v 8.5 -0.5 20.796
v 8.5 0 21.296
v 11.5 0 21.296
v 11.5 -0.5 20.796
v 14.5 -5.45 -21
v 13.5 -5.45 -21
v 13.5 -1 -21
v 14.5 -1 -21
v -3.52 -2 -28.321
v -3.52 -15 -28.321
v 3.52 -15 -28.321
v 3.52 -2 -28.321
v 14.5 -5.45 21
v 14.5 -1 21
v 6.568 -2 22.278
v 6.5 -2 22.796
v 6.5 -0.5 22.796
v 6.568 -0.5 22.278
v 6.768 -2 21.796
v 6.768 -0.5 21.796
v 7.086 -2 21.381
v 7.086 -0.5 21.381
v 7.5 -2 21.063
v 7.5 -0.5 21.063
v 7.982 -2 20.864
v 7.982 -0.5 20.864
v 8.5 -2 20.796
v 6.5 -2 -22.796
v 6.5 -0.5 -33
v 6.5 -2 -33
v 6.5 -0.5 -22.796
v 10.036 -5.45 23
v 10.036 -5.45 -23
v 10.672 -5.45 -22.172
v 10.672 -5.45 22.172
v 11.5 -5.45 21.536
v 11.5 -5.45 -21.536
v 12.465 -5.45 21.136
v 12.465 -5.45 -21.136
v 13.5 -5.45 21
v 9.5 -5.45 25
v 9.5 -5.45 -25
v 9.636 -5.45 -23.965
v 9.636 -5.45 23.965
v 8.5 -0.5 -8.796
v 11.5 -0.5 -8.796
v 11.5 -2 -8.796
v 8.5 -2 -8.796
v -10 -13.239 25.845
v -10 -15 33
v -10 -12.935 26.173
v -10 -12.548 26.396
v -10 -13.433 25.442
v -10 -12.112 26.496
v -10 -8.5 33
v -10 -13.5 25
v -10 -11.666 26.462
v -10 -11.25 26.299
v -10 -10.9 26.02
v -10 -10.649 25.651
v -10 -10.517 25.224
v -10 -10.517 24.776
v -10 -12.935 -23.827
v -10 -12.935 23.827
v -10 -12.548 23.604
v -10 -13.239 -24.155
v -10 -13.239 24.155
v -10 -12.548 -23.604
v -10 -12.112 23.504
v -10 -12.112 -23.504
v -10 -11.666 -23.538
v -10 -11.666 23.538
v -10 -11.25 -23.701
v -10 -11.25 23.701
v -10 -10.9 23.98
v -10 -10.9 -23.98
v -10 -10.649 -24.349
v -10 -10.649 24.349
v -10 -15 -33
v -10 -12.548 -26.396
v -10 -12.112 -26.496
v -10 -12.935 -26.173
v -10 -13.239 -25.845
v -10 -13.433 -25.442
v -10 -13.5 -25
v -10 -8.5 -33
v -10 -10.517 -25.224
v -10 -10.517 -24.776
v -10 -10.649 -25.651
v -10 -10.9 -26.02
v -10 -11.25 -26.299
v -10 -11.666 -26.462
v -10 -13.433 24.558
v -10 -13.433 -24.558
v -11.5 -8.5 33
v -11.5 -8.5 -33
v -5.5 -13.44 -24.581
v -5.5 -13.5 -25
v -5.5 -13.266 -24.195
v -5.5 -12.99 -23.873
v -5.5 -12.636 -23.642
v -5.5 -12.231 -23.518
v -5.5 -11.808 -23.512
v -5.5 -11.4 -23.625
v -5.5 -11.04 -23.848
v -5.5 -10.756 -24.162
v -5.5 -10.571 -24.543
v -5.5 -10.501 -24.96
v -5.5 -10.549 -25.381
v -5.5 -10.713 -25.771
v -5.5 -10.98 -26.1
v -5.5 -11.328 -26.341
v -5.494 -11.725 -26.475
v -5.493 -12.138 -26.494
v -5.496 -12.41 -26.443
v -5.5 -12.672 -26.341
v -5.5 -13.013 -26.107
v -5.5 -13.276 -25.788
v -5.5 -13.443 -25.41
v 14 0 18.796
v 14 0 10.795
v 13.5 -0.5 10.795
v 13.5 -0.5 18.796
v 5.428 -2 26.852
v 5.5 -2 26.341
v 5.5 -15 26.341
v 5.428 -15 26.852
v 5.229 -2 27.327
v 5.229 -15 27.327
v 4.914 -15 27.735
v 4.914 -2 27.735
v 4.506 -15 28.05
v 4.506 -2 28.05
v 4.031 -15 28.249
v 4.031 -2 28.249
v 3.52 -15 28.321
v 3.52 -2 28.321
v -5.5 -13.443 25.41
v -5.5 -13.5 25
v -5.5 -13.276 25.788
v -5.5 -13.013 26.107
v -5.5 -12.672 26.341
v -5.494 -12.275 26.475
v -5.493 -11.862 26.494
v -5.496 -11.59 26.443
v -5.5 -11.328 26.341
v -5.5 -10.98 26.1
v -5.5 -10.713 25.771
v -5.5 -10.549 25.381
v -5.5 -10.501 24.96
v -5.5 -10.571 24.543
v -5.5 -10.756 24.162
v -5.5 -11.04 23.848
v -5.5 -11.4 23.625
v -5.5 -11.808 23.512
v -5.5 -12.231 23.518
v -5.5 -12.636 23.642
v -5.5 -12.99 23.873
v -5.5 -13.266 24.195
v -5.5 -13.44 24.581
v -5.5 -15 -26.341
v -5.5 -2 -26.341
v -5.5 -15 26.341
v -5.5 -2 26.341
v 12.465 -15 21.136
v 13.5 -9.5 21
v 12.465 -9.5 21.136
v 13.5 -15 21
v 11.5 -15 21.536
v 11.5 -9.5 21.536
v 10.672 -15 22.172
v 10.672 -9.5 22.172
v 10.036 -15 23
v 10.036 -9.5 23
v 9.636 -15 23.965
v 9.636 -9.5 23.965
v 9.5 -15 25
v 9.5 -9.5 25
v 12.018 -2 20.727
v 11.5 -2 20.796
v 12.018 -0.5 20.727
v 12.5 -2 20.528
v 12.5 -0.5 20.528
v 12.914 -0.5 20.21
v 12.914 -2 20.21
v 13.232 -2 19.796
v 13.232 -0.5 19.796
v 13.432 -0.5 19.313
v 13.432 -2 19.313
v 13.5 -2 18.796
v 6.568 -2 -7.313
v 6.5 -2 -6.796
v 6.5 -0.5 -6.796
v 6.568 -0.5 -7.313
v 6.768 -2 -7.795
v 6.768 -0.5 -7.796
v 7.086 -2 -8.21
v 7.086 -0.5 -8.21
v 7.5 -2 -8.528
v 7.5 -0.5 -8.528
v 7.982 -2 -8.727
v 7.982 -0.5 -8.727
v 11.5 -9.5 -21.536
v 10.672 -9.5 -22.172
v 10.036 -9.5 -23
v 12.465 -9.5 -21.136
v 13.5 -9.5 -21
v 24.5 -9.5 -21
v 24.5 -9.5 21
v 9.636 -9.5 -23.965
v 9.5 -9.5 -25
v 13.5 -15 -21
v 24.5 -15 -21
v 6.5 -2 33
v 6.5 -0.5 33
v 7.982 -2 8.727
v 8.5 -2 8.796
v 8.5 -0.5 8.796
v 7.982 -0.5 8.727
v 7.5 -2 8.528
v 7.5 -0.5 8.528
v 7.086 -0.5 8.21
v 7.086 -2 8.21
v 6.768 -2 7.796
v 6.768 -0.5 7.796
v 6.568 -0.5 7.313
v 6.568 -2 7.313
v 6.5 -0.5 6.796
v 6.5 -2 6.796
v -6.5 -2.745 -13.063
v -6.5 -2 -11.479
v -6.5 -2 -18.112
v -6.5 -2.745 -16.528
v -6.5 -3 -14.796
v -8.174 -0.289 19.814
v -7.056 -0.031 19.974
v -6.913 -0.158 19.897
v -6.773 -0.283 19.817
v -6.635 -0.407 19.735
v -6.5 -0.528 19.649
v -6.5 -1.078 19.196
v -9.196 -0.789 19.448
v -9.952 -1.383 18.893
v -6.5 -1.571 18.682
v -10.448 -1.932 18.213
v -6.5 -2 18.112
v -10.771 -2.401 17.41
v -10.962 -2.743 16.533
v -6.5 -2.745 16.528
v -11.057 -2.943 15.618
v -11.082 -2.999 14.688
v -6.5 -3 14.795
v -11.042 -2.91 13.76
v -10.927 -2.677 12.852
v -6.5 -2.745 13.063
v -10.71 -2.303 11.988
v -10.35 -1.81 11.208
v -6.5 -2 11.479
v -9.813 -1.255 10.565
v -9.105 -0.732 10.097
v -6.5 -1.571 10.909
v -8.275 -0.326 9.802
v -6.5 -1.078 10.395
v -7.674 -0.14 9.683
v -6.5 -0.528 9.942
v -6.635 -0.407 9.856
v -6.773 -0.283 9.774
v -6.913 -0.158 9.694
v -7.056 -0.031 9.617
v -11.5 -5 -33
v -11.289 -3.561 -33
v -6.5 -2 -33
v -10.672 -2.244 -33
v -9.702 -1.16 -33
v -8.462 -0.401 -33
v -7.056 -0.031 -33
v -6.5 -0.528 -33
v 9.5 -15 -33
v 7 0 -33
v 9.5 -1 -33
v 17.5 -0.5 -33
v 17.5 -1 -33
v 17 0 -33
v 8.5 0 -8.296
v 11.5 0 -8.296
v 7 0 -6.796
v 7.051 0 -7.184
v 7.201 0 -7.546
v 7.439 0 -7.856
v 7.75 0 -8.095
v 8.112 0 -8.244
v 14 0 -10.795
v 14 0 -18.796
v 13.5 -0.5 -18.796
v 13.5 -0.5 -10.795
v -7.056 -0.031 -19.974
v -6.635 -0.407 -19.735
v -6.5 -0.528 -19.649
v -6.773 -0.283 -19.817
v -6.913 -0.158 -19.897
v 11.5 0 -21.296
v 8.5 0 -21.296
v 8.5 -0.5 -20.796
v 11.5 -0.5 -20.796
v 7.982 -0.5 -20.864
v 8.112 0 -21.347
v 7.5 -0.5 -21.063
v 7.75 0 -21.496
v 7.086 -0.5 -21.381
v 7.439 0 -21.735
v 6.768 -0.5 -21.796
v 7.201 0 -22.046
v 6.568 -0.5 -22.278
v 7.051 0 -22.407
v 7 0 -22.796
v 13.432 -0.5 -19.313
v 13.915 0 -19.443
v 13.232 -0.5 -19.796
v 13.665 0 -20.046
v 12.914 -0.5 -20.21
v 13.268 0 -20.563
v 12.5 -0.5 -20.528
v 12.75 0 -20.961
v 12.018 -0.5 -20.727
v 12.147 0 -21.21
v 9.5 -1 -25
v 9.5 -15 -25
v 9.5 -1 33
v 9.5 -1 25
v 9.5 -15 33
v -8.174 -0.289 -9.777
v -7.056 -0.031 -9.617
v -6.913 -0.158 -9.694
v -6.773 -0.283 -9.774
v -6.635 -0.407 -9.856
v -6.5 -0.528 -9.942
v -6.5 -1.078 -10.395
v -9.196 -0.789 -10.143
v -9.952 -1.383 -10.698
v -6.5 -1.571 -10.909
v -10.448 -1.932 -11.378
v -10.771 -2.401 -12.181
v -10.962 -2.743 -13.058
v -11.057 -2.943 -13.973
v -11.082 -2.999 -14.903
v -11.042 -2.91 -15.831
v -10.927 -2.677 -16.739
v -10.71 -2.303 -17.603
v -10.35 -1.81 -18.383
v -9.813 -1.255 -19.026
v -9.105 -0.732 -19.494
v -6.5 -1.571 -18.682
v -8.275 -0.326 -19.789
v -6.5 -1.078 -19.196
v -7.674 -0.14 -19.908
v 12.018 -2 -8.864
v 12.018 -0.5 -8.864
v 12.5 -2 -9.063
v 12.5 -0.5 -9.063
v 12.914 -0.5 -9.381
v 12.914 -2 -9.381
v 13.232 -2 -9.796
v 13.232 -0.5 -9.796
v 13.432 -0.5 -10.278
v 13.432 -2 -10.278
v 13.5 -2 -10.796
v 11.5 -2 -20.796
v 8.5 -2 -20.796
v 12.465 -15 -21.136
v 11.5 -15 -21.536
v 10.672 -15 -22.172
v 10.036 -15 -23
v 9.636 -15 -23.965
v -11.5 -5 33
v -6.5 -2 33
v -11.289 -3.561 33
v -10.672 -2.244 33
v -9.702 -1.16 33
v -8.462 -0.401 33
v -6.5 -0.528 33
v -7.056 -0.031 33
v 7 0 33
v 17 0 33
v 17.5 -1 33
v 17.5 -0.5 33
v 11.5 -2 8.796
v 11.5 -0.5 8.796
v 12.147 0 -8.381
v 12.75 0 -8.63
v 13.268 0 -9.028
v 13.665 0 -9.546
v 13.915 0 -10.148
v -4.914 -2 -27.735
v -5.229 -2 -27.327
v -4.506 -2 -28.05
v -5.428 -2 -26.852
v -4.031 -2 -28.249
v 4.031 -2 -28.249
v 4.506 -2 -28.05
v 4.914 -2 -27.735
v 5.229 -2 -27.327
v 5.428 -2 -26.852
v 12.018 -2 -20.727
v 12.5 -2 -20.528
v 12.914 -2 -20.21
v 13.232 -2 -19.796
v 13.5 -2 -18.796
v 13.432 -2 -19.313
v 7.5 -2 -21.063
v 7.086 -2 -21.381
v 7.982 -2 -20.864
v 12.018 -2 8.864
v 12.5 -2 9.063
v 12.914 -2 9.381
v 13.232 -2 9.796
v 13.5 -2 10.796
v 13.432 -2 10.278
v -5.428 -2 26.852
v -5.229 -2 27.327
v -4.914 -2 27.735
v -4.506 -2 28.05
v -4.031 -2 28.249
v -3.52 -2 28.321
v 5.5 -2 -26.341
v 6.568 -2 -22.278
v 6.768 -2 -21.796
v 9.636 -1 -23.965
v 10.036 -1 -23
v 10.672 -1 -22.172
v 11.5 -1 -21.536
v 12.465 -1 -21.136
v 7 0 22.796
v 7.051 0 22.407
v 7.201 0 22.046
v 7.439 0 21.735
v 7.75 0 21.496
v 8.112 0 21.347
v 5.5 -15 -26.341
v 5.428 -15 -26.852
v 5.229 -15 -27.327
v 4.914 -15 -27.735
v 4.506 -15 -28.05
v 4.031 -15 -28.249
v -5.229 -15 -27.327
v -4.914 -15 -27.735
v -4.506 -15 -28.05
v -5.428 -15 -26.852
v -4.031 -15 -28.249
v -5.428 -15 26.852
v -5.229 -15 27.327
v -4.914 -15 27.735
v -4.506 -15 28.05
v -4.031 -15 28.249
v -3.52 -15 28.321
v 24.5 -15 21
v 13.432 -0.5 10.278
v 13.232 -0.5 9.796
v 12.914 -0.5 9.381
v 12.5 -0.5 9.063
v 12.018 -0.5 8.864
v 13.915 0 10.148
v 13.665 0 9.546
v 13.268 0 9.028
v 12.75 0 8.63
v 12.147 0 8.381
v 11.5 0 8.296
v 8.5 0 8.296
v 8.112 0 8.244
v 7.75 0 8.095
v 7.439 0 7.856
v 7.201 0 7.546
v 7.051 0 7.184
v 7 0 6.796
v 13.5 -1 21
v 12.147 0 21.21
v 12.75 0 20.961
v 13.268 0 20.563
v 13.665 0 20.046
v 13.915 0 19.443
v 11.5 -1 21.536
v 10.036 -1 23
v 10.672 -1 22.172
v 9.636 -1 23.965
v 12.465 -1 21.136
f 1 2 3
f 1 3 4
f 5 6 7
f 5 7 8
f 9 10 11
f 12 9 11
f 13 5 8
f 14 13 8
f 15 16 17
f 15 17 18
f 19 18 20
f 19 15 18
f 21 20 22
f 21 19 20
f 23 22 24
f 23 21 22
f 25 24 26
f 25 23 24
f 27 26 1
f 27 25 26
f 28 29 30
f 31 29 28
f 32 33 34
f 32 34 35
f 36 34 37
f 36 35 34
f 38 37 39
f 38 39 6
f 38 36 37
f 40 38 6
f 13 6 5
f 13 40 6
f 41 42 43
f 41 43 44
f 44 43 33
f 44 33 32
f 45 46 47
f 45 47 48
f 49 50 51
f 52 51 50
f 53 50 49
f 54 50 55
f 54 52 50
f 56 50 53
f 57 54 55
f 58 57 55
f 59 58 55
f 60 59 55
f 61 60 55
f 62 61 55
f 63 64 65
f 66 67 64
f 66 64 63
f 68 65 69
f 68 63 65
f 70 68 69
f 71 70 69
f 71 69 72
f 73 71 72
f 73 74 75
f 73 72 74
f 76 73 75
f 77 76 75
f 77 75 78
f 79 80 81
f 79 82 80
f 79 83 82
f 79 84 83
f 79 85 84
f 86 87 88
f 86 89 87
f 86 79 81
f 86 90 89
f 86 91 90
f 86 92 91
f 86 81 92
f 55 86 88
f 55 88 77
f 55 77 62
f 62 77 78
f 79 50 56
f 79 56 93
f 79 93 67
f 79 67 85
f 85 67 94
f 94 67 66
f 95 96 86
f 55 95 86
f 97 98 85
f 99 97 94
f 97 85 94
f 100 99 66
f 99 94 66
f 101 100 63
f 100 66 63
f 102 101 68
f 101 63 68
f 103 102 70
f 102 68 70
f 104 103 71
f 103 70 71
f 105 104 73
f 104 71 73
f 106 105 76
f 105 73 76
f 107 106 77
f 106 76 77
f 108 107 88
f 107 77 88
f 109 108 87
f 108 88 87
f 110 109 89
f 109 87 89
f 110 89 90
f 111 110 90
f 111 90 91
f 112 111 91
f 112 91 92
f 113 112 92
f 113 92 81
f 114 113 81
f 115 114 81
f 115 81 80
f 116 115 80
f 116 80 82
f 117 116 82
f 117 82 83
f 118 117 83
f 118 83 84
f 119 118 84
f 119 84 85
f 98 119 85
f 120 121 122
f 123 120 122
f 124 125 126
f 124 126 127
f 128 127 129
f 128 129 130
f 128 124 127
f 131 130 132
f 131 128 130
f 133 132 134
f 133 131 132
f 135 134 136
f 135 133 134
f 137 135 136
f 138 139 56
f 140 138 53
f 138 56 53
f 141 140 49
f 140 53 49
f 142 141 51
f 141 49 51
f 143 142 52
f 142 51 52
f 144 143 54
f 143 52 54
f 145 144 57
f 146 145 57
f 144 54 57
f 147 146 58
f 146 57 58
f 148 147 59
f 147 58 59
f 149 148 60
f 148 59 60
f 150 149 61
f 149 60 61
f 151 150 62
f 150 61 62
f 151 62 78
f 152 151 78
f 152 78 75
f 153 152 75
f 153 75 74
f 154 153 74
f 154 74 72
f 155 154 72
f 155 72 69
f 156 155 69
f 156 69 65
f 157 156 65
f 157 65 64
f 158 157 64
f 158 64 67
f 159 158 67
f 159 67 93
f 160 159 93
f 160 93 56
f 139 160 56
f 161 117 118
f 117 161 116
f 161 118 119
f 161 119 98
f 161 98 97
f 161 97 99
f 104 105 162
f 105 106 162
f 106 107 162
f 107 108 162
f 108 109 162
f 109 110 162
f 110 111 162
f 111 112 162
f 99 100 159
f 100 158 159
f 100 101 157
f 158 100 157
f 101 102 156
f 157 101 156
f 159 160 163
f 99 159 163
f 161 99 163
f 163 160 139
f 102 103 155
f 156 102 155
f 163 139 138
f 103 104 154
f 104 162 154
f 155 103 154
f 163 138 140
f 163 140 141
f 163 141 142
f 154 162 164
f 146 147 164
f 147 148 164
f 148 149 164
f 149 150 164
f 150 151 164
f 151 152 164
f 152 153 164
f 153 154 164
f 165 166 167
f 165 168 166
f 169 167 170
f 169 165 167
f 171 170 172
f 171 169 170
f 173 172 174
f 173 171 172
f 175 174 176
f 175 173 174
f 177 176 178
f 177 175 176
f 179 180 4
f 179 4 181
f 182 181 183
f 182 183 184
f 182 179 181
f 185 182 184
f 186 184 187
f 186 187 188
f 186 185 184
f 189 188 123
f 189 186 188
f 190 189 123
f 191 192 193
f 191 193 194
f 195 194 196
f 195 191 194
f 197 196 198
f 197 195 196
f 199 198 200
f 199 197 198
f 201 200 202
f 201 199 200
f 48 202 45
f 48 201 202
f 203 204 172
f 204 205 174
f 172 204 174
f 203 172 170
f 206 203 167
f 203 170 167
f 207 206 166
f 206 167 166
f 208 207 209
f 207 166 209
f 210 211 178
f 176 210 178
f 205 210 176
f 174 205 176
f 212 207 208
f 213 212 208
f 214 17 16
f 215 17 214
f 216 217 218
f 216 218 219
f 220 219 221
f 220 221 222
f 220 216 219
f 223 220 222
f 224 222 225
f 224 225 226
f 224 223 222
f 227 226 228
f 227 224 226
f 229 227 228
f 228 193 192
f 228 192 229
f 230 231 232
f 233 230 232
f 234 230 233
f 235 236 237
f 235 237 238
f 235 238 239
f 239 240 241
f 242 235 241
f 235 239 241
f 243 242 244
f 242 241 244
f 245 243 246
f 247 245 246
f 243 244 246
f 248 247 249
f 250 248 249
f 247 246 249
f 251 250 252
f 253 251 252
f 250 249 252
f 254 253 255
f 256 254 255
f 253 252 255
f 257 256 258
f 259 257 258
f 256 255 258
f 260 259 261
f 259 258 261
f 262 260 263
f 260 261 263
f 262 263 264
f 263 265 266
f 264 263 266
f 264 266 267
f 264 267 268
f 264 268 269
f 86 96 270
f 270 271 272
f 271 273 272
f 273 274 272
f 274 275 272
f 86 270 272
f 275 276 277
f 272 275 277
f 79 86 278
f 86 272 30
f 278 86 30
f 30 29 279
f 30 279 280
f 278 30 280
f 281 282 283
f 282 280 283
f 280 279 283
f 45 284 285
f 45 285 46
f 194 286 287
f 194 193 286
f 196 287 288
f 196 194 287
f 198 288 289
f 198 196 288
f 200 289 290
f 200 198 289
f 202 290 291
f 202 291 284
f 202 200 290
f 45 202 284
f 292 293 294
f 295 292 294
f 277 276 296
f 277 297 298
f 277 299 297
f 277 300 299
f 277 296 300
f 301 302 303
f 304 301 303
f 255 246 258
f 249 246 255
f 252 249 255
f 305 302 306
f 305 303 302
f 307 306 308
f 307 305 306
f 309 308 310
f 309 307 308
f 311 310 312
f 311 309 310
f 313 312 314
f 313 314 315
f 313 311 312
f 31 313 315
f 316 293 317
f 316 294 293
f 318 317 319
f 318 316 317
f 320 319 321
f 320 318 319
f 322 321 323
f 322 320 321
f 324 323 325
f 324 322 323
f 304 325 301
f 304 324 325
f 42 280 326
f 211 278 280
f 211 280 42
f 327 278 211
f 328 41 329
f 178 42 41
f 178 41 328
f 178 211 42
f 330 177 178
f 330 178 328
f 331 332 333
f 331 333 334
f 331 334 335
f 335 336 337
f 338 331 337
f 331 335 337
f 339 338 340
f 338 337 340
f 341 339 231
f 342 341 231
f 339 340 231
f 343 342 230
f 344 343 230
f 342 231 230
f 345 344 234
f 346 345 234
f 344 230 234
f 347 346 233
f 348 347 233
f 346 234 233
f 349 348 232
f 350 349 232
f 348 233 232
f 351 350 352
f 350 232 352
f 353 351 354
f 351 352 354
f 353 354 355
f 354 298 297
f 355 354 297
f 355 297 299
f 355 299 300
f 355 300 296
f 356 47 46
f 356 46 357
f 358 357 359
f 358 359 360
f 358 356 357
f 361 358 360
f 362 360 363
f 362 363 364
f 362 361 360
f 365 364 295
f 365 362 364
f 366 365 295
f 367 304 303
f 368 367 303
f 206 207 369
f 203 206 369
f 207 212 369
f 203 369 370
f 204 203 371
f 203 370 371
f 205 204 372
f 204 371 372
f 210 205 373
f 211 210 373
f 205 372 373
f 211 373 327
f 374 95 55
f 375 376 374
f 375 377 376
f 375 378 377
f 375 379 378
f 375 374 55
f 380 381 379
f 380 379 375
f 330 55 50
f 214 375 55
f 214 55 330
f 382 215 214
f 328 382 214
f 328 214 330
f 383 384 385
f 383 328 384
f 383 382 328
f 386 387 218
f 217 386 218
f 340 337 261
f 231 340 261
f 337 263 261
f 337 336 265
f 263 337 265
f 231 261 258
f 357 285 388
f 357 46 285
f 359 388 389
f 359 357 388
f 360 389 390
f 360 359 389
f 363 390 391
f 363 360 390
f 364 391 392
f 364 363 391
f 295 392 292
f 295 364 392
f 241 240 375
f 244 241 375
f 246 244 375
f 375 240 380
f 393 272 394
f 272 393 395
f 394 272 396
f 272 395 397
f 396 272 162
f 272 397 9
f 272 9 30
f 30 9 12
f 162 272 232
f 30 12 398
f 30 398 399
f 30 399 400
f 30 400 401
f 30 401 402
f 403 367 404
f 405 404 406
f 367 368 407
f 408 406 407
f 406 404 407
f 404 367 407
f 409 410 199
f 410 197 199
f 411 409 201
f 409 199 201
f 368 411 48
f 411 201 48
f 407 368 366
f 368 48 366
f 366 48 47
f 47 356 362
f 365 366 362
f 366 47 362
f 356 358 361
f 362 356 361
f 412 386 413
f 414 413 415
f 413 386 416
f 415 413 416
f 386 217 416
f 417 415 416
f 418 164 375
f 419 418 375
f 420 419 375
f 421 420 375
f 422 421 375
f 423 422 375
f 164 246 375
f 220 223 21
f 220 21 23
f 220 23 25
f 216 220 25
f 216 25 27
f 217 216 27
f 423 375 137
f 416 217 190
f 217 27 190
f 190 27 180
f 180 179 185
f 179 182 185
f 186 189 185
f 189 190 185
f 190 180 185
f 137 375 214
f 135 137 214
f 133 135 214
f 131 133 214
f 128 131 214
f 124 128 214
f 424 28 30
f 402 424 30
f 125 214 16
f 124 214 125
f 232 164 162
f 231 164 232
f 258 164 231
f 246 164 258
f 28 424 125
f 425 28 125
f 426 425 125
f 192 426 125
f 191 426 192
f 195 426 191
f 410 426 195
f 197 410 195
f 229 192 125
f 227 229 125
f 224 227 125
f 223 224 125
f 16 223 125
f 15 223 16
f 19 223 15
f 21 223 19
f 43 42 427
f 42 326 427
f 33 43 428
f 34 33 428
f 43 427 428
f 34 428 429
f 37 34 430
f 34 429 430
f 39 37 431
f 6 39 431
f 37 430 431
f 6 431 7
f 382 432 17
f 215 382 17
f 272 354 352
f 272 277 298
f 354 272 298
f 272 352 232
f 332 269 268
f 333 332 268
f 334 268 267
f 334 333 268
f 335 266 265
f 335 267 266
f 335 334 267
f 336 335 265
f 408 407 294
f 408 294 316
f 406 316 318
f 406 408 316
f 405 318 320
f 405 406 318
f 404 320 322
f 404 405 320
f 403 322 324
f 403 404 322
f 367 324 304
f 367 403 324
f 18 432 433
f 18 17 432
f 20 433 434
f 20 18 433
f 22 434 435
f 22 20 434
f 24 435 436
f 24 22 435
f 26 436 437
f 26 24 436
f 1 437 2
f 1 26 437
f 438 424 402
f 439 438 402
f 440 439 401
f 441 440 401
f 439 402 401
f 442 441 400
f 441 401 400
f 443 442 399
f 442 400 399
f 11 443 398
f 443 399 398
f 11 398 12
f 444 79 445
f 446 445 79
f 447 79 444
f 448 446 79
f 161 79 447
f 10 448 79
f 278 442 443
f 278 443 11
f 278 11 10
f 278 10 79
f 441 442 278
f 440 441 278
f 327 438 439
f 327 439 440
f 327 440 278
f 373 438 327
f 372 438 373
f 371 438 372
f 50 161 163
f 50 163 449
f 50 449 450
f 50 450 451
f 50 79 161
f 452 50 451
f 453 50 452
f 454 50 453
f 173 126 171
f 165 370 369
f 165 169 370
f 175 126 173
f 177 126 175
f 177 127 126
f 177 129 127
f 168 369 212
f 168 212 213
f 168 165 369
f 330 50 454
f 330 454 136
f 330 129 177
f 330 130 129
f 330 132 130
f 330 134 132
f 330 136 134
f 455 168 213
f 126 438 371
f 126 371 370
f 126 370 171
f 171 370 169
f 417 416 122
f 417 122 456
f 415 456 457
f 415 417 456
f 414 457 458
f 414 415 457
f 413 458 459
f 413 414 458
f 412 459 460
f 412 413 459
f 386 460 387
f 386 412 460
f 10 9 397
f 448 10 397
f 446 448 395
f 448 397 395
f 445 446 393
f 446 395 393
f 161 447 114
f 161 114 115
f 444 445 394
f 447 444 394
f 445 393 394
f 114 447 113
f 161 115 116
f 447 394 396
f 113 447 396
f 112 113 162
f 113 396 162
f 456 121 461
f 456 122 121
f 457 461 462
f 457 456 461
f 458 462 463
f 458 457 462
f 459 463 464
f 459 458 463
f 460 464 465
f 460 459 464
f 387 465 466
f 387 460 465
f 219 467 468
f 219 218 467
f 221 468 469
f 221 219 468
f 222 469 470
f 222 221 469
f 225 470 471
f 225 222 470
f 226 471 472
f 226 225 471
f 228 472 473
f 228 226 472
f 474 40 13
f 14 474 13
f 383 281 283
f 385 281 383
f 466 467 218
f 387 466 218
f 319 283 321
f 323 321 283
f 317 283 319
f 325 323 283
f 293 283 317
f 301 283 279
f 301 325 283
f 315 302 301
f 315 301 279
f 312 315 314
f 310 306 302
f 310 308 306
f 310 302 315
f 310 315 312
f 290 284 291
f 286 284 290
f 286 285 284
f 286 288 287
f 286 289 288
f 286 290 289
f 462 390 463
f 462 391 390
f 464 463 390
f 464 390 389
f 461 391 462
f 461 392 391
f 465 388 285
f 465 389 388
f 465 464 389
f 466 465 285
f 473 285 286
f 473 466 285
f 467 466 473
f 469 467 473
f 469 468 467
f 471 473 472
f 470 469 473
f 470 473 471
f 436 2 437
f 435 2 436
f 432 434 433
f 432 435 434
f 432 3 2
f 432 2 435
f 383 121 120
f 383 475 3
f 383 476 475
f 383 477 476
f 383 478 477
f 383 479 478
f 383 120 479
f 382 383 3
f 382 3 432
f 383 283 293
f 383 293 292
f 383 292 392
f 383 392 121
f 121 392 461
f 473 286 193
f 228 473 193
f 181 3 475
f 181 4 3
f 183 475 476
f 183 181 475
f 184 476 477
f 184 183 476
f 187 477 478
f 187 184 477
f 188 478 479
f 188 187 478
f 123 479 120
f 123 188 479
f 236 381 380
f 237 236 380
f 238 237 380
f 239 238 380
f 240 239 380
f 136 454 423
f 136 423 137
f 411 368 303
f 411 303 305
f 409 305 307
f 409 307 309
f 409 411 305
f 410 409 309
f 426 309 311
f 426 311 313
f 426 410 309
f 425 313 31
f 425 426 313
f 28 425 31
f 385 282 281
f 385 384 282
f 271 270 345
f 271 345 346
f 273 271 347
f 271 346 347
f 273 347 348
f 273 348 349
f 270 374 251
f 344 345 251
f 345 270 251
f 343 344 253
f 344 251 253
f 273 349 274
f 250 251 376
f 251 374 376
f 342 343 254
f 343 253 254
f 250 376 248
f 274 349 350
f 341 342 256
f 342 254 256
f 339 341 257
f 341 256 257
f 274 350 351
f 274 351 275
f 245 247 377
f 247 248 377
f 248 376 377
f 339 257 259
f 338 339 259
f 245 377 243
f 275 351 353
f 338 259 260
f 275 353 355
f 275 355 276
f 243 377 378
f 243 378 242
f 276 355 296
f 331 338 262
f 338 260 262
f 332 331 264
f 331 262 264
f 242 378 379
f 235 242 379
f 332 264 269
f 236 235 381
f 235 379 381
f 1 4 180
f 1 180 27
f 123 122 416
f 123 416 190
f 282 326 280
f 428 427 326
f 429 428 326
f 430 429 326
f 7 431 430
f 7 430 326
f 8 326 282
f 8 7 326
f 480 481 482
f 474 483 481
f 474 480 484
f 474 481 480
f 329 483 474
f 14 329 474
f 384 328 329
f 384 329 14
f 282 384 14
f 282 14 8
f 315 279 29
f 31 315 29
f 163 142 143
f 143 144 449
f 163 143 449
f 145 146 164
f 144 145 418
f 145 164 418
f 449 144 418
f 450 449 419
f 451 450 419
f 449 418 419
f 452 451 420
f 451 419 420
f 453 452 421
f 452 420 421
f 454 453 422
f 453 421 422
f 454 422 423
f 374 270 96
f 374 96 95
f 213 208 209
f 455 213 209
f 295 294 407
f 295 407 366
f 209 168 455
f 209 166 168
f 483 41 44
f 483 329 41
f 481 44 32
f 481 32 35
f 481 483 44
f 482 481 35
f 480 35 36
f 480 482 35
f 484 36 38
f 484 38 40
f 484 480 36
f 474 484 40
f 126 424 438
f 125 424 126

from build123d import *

# Parameters (mm, degrees)
F0_W           = 21
F0_H           = 66
F0_W_2         = 11
F0_H_2         = 56.642
F1_DEPTH       = 15
F2_R           = 5
F4_START       = 9.5
F3_W           = 15
F3_H           = 42
F4_DEPTH       = 5.5
F5_T1_DEPTH    = 15
F6_W           = 1.5
F6_H           = 6.5
F7_DEPTH       = 50
F7_DEPTH_BACK  = 50
F8_R           = 1.5
F9_DEPTH       = 5
F10_W          = 3
F10_H          = 1
F11_DEPTH      = 33
F11_DEPTH_BACK = 33
F12_SIZE       = 0.5
F13_W          = 5
F13_H          = 12
F14_DEPTH      = 14
F15_R          = 4
F16_W          = 13
F16_H          = 70
F17_DEPTH      = 2
F18_W          = 20
F18_H          = 12
F19_DEPTH      = 2
F20_R          = 2
F21_T1_DEPTH   = 68.8536746712
F21_T3_DEPTH   = 11.490341494
F21_T5_DEPTH   = 3
F21_T7_DEPTH   = 8
F21_T9_DEPTH   = 11.490341494
F21_T11_DEPTH  = 13.591
F21_T13_DEPTH  = 8
F21_T16_ANGLE  = 90
F21_T18_ANGLE  = 90
F21_T20_ANGLE  = 90
F21_T22_ANGLE  = 90
F21_T24_ANGLE  = 90
F21_T26_ANGLE  = 90
F21_T28_ANGLE  = 90
F21_T30_ANGLE  = 90
F23_START      = -6.5
F22_R          = 6
F23_DEPTH      = 5.001


# Not quite as in the source:
# - a fillet or chamfer that OpenCascade refuses, or shapes differently, is made with other operations: its cross-section is extruded or revolved along the edge and cut away or added


with BuildPart() as f1:
    # F0 (on Front) → F1 (new body)
    with BuildSketch(Plane.XZ):
        with Locations((-1, 0)):
            Rectangle(F0_W, F0_H)
        Rectangle(F0_W_2, F0_H_2, mode=Mode.SUBTRACT)
    extrude(amount=F1_DEPTH)

    # F2
    f2_edges = [f1.edges().sort_by_distance(p)[0] for p in [
        (-11.5, 0, 0),
    ]]
    fillet(f2_edges, radius=F2_R)

    # F3 (on Front) → F4 (join)
    with BuildSketch(Plane.XZ.offset(F4_START)):
        with Locations((17, 0)):
            Rectangle(F3_W, F3_H)
    extrude(amount=F4_DEPTH)

    # F5: fillet of radius 2 on 4 edges, made by hand

    # F5_s2 → F5_t1 (join)
    with BuildSketch(Plane.XZ):
        with BuildLine():
            ThreePointArc((5.5001, -26.3211), (4.9143135624, -27.7353135624), (3.5001, -28.3211))
            Line((3.5001, -28.3211), (3.5001, -28.3611))
            ThreePointArc((3.5001, -28.3611), (4.50005, -28.361), (5.5, -28.361))
            Line((5.5, -28.361), (5.54, -28.321))
            ThreePointArc((5.54, -28.321), (5.54, -27.32105), (5.5401, -26.3211))
            Line((5.5401, -26.3211), (5.5001, -26.3211))
        make_face()
        with BuildLine():
            ThreePointArc((-3.5001, -28.3211), (-4.9143135624, -27.7353135624), (-5.5001, -26.3211))
            Line((-5.5001, -26.3211), (-5.5401, -26.3211))
            ThreePointArc((-5.5401, -26.3211), (-5.54, -27.32105), (-5.54, -28.321))
            Line((-5.54, -28.321), (-5.5, -28.361))
            ThreePointArc((-5.5, -28.361), (-4.50005, -28.361), (-3.5001, -28.3611))
            Line((-3.5001, -28.3611), (-3.5001, -28.3211))
        make_face()
        with BuildLine():
            ThreePointArc((-5.5001, 26.3211), (-4.9143135624, 27.7353135624), (-3.5001, 28.3211))
            Line((-3.5001, 28.3211), (-3.5001, 28.3611))
            ThreePointArc((-3.5001, 28.3611), (-4.50005, 28.361), (-5.5, 28.361))
            Line((-5.5, 28.361), (-5.54, 28.321))
            ThreePointArc((-5.54, 28.321), (-5.54, 27.32105), (-5.5401, 26.3211))
            Line((-5.5401, 26.3211), (-5.5001, 26.3211))
        make_face()
        with BuildLine():
            ThreePointArc((5.5001, 26.3211), (4.9143135624, 27.7353135624), (3.5001, 28.3211))
            Line((3.5001, 28.3211), (3.5001, 28.3611))
            ThreePointArc((3.5001, 28.3611), (4.50005, 28.361), (5.5, 28.361))
            Line((5.5, 28.361), (5.54, 28.321))
            ThreePointArc((5.54, 28.321), (5.54, 27.32105), (5.5401, 26.3211))
            Line((5.5401, 26.3211), (5.5001, 26.3211))
        make_face()
    extrude(amount=F5_T1_DEPTH)

    # F6 (on Top) → F7 (cut, two sides)
    with BuildSketch(Plane.XY) as f7_sk:
        with Locations((-10.75, -11.75)):
            Rectangle(F6_W, F6_H)
    extrude(amount=-F7_DEPTH, mode=Mode.SUBTRACT)
    extrude(f7_sk.sketch, amount=F7_DEPTH_BACK, mode=Mode.SUBTRACT)

    # F8 (on face) → F9 (cut)
    with BuildSketch(Plane(origin=(-10, 0, 0), x_dir=(0, -1, 0), z_dir=(-1, 0, 0))):
        with Locations((12, 25)):
            Circle(F8_R)
        with Locations((12, -25)):
            Circle(F8_R)
    extrude(amount=-F9_DEPTH, mode=Mode.SUBTRACT)

    # F10 (on Top) → F11 (join, two sides)
    with BuildSketch(Plane.XY) as f11_sk:
        with Locations((16, -0.5)):
            Rectangle(F10_W, F10_H)
        Polygon((14.5, -5.45), (14.5, -1), (14.5, 0), (9.5, 0), (9.5, -5.45), align=None)
    extrude(amount=F11_DEPTH)
    extrude(f11_sk.sketch, amount=-F11_DEPTH_BACK)

    # F12
    f12_edges = [f1.edges().sort_by_distance(p)[0] for p in [
        (17.5, 0, 0),
    ]]
    chamfer(f12_edges, length=F12_SIZE)

    # F13 (on face) → F14 (cut)
    with BuildSketch(Plane.XZ.offset(15)):
        with Locations((12, -27)):
            Rectangle(F13_W, F13_H)
        with Locations((12, 27)):
            Rectangle(F13_W, F13_H)
    extrude(amount=-F14_DEPTH, mode=Mode.SUBTRACT)

    # F15
    f15_edges = [f1.edges().sort_by_distance(p)[0] for p in [
        (9.5, -3.225, -21),
        (9.5, -12.25, -21),
        (9.5, -3.225, 21),
        (9.5, -12.25, 21),
    ]]
    fillet(f15_edges, radius=F15_R)

    # F16 (on Front) → F17 (cut)
    with BuildSketch(Plane.XZ):
        Rectangle(F16_W, F16_H)
    extrude(amount=F17_DEPTH, mode=Mode.SUBTRACT)

    # F18 (on face) → F19 (cut)
    with BuildSketch(Plane(origin=(0, 0, 0), x_dir=(-1, 0, 0), z_dir=(0, 1, 0))):
        with Locations((-3.5, 14.7955)):
            Rectangle(F18_W, F18_H)
        with Locations((-3.5, -14.7955)):
            Rectangle(F18_W, F18_H)
    extrude(amount=-F19_DEPTH, mode=Mode.SUBTRACT)

    # F20
    f20_edges = [f1.edges().sort_by_distance(p)[0] for p in [
        (13.5, -1, -20.7955),
        (13.5, -1, 20.7955),
        (6.5, -1, 20.7955),
        (6.5, -1, 8.7955),
        (6.5, -1, -8.7955),
        (6.5, -1, -20.7955),
        (13.5, -1, -8.7955),
        (13.5, -1, 8.7955),
    ]]
    fillet(f20_edges, radius=F20_R)

    # F21: chamfer of 0.5 on 18 edges, made by hand

    # F21_s2 → F21_t1 (cut)
    with BuildSketch(Plane.XY.offset(-34.4268373356)):
        with BuildLine():
            Line((-7.0555555556, -0.03096005), (-6.5, -0.527864045))
            Line((-6.5, -0.527864045), (-6.5, 0))
            ThreePointArc((-6.5, 0), (-6.7852695606, -0.0081445055), (-7.0555555556, -0.03096005))
        make_face()
    extrude(amount=F21_T1_DEPTH, mode=Mode.SUBTRACT)

    # F21_s4 → F21_t3 (cut)
    with BuildSketch(Plane.XY.offset(-34.285841494)):
        Polygon((7, 0), (6.5, -0.5), (6.5, 0), align=None)
    extrude(amount=F21_T3_DEPTH, mode=Mode.SUBTRACT)

    # F21_s6 → F21_t5 (cut)
    with BuildSketch(Plane.YZ.offset(8.5)):
        Polygon((0, -21.2955), (-0.5, -20.7955), (0, -20.7955), align=None)
        Polygon((0, -8.2955), (-0.5, -8.7955), (0, -8.7955), align=None)
        Polygon((0, 21.2955), (-0.5, 20.7955), (0, 20.7955), align=None)
        Polygon((0, 8.2955), (-0.5, 8.7955), (0, 8.7955), align=None)
    extrude(amount=F21_T5_DEPTH, mode=Mode.SUBTRACT)

    # F21_s8 → F21_t7 (cut)
    with BuildSketch(Plane.XY.offset(-18.7955)):
        Polygon((14, 0), (13.5, -0.5), (13.5, 0), align=None)
    extrude(amount=F21_T7_DEPTH, mode=Mode.SUBTRACT)

    # F21_s10 → F21_t9 (cut)
    with BuildSketch(Plane.XY.offset(22.7955)):
        Polygon((7, 0), (6.5, -0.5), (6.5, 0), align=None)
    extrude(amount=F21_T9_DEPTH, mode=Mode.SUBTRACT)

    # F21_s12 → F21_t11 (cut)
    with BuildSketch(Plane.XY.offset(-6.7955)):
        Polygon((7, 0), (6.5, -0.5), (6.5, 0), align=None)
    extrude(amount=F21_T11_DEPTH, mode=Mode.SUBTRACT)

    # F21_s14 → F21_t13 (cut)
    with BuildSketch(Plane.XY.offset(10.7955)):
        Polygon((14, 0), (13.5, -0.5), (13.5, 0), align=None)
    extrude(amount=F21_T13_DEPTH, mode=Mode.SUBTRACT)

    # F21_s15 → F21_t16 (revolve, cut)
    with BuildSketch(Plane.YZ.offset(8.5)):
        Polygon((0, -21.2955), (-0.5, -20.7955), (0, -20.7955), align=None)
    revolve(axis=Axis((8.5, 0, -22.7955), (0, -1, 0)), revolution_arc=F21_T16_ANGLE, mode=Mode.SUBTRACT)

    # F21_s17 → F21_t18 (revolve, cut)
    with BuildSketch(Plane.XY.offset(-18.7955)):
        Polygon((14, 0), (13.5, -0.5), (13.5, 0), align=None)
    revolve(axis=Axis((11.5, 0, -18.7955), (0, 1, 0)), revolution_arc=F21_T18_ANGLE, mode=Mode.SUBTRACT)

    # F21_s19 → F21_t20 (revolve, cut)
    with BuildSketch(Plane.YZ.offset(11.5)):
        Polygon((0, -8.2955), (-0.5, -8.7955), (0, -8.7955), align=None)
    revolve(axis=Axis((11.5, 0, -10.7955), (0, 1, 0)), revolution_arc=F21_T20_ANGLE, mode=Mode.SUBTRACT)

    # F21_s21 → F21_t22 (revolve, cut)
    with BuildSketch(Plane.XY.offset(22.7955)):
        Polygon((7, 0), (6.5, -0.5), (6.5, 0), align=None)
    revolve(axis=Axis((8.5, 0, 22.7955), (0, -1, 0)), revolution_arc=F21_T22_ANGLE, mode=Mode.SUBTRACT)

    # F21_s23 → F21_t24 (revolve, cut)
    with BuildSketch(Plane.XY.offset(-6.7955)):
        Polygon((7, 0), (6.5, -0.5), (6.5, 0), align=None)
    revolve(axis=Axis((8.5, 0, -6.7955), (0, -1, 0)), revolution_arc=F21_T24_ANGLE, mode=Mode.SUBTRACT)

    # F21_s25 → F21_t26 (revolve, cut)
    with BuildSketch(Plane.YZ.offset(11.5)):
        Polygon((0, 21.2955), (-0.5, 20.7955), (0, 20.7955), align=None)
    revolve(axis=Axis((11.5, 0, 18.7955), (0, 1, 0)), revolution_arc=F21_T26_ANGLE, mode=Mode.SUBTRACT)

    # F21_s27 → F21_t28 (revolve, cut)
    with BuildSketch(Plane.YZ.offset(8.5)):
        Polygon((0, 8.2955), (-0.5, 8.7955), (0, 8.7955), align=None)
    revolve(axis=Axis((8.5, 0, 6.7955), (0, -1, 0)), revolution_arc=F21_T28_ANGLE, mode=Mode.SUBTRACT)

    # F21_s29 → F21_t30 (revolve, cut)
    with BuildSketch(Plane.XY.offset(10.7955)):
        Polygon((14, 0), (13.5, -0.5), (13.5, 0), align=None)
    revolve(axis=Axis((11.5, 0, 10.7955), (0, 1, 0)), revolution_arc=F21_T30_ANGLE, mode=Mode.SUBTRACT)

    # F22 (on Right) → F23 (cut)
    with BuildSketch(Plane.YZ.offset(F23_START)):
        with Locations((3, -14.7955)):
            Circle(F22_R)
        with Locations((3, 14.7955)):
            Circle(F22_R)
    extrude(amount=-F23_DEPTH, mode=Mode.SUBTRACT)


solid = f1.part
